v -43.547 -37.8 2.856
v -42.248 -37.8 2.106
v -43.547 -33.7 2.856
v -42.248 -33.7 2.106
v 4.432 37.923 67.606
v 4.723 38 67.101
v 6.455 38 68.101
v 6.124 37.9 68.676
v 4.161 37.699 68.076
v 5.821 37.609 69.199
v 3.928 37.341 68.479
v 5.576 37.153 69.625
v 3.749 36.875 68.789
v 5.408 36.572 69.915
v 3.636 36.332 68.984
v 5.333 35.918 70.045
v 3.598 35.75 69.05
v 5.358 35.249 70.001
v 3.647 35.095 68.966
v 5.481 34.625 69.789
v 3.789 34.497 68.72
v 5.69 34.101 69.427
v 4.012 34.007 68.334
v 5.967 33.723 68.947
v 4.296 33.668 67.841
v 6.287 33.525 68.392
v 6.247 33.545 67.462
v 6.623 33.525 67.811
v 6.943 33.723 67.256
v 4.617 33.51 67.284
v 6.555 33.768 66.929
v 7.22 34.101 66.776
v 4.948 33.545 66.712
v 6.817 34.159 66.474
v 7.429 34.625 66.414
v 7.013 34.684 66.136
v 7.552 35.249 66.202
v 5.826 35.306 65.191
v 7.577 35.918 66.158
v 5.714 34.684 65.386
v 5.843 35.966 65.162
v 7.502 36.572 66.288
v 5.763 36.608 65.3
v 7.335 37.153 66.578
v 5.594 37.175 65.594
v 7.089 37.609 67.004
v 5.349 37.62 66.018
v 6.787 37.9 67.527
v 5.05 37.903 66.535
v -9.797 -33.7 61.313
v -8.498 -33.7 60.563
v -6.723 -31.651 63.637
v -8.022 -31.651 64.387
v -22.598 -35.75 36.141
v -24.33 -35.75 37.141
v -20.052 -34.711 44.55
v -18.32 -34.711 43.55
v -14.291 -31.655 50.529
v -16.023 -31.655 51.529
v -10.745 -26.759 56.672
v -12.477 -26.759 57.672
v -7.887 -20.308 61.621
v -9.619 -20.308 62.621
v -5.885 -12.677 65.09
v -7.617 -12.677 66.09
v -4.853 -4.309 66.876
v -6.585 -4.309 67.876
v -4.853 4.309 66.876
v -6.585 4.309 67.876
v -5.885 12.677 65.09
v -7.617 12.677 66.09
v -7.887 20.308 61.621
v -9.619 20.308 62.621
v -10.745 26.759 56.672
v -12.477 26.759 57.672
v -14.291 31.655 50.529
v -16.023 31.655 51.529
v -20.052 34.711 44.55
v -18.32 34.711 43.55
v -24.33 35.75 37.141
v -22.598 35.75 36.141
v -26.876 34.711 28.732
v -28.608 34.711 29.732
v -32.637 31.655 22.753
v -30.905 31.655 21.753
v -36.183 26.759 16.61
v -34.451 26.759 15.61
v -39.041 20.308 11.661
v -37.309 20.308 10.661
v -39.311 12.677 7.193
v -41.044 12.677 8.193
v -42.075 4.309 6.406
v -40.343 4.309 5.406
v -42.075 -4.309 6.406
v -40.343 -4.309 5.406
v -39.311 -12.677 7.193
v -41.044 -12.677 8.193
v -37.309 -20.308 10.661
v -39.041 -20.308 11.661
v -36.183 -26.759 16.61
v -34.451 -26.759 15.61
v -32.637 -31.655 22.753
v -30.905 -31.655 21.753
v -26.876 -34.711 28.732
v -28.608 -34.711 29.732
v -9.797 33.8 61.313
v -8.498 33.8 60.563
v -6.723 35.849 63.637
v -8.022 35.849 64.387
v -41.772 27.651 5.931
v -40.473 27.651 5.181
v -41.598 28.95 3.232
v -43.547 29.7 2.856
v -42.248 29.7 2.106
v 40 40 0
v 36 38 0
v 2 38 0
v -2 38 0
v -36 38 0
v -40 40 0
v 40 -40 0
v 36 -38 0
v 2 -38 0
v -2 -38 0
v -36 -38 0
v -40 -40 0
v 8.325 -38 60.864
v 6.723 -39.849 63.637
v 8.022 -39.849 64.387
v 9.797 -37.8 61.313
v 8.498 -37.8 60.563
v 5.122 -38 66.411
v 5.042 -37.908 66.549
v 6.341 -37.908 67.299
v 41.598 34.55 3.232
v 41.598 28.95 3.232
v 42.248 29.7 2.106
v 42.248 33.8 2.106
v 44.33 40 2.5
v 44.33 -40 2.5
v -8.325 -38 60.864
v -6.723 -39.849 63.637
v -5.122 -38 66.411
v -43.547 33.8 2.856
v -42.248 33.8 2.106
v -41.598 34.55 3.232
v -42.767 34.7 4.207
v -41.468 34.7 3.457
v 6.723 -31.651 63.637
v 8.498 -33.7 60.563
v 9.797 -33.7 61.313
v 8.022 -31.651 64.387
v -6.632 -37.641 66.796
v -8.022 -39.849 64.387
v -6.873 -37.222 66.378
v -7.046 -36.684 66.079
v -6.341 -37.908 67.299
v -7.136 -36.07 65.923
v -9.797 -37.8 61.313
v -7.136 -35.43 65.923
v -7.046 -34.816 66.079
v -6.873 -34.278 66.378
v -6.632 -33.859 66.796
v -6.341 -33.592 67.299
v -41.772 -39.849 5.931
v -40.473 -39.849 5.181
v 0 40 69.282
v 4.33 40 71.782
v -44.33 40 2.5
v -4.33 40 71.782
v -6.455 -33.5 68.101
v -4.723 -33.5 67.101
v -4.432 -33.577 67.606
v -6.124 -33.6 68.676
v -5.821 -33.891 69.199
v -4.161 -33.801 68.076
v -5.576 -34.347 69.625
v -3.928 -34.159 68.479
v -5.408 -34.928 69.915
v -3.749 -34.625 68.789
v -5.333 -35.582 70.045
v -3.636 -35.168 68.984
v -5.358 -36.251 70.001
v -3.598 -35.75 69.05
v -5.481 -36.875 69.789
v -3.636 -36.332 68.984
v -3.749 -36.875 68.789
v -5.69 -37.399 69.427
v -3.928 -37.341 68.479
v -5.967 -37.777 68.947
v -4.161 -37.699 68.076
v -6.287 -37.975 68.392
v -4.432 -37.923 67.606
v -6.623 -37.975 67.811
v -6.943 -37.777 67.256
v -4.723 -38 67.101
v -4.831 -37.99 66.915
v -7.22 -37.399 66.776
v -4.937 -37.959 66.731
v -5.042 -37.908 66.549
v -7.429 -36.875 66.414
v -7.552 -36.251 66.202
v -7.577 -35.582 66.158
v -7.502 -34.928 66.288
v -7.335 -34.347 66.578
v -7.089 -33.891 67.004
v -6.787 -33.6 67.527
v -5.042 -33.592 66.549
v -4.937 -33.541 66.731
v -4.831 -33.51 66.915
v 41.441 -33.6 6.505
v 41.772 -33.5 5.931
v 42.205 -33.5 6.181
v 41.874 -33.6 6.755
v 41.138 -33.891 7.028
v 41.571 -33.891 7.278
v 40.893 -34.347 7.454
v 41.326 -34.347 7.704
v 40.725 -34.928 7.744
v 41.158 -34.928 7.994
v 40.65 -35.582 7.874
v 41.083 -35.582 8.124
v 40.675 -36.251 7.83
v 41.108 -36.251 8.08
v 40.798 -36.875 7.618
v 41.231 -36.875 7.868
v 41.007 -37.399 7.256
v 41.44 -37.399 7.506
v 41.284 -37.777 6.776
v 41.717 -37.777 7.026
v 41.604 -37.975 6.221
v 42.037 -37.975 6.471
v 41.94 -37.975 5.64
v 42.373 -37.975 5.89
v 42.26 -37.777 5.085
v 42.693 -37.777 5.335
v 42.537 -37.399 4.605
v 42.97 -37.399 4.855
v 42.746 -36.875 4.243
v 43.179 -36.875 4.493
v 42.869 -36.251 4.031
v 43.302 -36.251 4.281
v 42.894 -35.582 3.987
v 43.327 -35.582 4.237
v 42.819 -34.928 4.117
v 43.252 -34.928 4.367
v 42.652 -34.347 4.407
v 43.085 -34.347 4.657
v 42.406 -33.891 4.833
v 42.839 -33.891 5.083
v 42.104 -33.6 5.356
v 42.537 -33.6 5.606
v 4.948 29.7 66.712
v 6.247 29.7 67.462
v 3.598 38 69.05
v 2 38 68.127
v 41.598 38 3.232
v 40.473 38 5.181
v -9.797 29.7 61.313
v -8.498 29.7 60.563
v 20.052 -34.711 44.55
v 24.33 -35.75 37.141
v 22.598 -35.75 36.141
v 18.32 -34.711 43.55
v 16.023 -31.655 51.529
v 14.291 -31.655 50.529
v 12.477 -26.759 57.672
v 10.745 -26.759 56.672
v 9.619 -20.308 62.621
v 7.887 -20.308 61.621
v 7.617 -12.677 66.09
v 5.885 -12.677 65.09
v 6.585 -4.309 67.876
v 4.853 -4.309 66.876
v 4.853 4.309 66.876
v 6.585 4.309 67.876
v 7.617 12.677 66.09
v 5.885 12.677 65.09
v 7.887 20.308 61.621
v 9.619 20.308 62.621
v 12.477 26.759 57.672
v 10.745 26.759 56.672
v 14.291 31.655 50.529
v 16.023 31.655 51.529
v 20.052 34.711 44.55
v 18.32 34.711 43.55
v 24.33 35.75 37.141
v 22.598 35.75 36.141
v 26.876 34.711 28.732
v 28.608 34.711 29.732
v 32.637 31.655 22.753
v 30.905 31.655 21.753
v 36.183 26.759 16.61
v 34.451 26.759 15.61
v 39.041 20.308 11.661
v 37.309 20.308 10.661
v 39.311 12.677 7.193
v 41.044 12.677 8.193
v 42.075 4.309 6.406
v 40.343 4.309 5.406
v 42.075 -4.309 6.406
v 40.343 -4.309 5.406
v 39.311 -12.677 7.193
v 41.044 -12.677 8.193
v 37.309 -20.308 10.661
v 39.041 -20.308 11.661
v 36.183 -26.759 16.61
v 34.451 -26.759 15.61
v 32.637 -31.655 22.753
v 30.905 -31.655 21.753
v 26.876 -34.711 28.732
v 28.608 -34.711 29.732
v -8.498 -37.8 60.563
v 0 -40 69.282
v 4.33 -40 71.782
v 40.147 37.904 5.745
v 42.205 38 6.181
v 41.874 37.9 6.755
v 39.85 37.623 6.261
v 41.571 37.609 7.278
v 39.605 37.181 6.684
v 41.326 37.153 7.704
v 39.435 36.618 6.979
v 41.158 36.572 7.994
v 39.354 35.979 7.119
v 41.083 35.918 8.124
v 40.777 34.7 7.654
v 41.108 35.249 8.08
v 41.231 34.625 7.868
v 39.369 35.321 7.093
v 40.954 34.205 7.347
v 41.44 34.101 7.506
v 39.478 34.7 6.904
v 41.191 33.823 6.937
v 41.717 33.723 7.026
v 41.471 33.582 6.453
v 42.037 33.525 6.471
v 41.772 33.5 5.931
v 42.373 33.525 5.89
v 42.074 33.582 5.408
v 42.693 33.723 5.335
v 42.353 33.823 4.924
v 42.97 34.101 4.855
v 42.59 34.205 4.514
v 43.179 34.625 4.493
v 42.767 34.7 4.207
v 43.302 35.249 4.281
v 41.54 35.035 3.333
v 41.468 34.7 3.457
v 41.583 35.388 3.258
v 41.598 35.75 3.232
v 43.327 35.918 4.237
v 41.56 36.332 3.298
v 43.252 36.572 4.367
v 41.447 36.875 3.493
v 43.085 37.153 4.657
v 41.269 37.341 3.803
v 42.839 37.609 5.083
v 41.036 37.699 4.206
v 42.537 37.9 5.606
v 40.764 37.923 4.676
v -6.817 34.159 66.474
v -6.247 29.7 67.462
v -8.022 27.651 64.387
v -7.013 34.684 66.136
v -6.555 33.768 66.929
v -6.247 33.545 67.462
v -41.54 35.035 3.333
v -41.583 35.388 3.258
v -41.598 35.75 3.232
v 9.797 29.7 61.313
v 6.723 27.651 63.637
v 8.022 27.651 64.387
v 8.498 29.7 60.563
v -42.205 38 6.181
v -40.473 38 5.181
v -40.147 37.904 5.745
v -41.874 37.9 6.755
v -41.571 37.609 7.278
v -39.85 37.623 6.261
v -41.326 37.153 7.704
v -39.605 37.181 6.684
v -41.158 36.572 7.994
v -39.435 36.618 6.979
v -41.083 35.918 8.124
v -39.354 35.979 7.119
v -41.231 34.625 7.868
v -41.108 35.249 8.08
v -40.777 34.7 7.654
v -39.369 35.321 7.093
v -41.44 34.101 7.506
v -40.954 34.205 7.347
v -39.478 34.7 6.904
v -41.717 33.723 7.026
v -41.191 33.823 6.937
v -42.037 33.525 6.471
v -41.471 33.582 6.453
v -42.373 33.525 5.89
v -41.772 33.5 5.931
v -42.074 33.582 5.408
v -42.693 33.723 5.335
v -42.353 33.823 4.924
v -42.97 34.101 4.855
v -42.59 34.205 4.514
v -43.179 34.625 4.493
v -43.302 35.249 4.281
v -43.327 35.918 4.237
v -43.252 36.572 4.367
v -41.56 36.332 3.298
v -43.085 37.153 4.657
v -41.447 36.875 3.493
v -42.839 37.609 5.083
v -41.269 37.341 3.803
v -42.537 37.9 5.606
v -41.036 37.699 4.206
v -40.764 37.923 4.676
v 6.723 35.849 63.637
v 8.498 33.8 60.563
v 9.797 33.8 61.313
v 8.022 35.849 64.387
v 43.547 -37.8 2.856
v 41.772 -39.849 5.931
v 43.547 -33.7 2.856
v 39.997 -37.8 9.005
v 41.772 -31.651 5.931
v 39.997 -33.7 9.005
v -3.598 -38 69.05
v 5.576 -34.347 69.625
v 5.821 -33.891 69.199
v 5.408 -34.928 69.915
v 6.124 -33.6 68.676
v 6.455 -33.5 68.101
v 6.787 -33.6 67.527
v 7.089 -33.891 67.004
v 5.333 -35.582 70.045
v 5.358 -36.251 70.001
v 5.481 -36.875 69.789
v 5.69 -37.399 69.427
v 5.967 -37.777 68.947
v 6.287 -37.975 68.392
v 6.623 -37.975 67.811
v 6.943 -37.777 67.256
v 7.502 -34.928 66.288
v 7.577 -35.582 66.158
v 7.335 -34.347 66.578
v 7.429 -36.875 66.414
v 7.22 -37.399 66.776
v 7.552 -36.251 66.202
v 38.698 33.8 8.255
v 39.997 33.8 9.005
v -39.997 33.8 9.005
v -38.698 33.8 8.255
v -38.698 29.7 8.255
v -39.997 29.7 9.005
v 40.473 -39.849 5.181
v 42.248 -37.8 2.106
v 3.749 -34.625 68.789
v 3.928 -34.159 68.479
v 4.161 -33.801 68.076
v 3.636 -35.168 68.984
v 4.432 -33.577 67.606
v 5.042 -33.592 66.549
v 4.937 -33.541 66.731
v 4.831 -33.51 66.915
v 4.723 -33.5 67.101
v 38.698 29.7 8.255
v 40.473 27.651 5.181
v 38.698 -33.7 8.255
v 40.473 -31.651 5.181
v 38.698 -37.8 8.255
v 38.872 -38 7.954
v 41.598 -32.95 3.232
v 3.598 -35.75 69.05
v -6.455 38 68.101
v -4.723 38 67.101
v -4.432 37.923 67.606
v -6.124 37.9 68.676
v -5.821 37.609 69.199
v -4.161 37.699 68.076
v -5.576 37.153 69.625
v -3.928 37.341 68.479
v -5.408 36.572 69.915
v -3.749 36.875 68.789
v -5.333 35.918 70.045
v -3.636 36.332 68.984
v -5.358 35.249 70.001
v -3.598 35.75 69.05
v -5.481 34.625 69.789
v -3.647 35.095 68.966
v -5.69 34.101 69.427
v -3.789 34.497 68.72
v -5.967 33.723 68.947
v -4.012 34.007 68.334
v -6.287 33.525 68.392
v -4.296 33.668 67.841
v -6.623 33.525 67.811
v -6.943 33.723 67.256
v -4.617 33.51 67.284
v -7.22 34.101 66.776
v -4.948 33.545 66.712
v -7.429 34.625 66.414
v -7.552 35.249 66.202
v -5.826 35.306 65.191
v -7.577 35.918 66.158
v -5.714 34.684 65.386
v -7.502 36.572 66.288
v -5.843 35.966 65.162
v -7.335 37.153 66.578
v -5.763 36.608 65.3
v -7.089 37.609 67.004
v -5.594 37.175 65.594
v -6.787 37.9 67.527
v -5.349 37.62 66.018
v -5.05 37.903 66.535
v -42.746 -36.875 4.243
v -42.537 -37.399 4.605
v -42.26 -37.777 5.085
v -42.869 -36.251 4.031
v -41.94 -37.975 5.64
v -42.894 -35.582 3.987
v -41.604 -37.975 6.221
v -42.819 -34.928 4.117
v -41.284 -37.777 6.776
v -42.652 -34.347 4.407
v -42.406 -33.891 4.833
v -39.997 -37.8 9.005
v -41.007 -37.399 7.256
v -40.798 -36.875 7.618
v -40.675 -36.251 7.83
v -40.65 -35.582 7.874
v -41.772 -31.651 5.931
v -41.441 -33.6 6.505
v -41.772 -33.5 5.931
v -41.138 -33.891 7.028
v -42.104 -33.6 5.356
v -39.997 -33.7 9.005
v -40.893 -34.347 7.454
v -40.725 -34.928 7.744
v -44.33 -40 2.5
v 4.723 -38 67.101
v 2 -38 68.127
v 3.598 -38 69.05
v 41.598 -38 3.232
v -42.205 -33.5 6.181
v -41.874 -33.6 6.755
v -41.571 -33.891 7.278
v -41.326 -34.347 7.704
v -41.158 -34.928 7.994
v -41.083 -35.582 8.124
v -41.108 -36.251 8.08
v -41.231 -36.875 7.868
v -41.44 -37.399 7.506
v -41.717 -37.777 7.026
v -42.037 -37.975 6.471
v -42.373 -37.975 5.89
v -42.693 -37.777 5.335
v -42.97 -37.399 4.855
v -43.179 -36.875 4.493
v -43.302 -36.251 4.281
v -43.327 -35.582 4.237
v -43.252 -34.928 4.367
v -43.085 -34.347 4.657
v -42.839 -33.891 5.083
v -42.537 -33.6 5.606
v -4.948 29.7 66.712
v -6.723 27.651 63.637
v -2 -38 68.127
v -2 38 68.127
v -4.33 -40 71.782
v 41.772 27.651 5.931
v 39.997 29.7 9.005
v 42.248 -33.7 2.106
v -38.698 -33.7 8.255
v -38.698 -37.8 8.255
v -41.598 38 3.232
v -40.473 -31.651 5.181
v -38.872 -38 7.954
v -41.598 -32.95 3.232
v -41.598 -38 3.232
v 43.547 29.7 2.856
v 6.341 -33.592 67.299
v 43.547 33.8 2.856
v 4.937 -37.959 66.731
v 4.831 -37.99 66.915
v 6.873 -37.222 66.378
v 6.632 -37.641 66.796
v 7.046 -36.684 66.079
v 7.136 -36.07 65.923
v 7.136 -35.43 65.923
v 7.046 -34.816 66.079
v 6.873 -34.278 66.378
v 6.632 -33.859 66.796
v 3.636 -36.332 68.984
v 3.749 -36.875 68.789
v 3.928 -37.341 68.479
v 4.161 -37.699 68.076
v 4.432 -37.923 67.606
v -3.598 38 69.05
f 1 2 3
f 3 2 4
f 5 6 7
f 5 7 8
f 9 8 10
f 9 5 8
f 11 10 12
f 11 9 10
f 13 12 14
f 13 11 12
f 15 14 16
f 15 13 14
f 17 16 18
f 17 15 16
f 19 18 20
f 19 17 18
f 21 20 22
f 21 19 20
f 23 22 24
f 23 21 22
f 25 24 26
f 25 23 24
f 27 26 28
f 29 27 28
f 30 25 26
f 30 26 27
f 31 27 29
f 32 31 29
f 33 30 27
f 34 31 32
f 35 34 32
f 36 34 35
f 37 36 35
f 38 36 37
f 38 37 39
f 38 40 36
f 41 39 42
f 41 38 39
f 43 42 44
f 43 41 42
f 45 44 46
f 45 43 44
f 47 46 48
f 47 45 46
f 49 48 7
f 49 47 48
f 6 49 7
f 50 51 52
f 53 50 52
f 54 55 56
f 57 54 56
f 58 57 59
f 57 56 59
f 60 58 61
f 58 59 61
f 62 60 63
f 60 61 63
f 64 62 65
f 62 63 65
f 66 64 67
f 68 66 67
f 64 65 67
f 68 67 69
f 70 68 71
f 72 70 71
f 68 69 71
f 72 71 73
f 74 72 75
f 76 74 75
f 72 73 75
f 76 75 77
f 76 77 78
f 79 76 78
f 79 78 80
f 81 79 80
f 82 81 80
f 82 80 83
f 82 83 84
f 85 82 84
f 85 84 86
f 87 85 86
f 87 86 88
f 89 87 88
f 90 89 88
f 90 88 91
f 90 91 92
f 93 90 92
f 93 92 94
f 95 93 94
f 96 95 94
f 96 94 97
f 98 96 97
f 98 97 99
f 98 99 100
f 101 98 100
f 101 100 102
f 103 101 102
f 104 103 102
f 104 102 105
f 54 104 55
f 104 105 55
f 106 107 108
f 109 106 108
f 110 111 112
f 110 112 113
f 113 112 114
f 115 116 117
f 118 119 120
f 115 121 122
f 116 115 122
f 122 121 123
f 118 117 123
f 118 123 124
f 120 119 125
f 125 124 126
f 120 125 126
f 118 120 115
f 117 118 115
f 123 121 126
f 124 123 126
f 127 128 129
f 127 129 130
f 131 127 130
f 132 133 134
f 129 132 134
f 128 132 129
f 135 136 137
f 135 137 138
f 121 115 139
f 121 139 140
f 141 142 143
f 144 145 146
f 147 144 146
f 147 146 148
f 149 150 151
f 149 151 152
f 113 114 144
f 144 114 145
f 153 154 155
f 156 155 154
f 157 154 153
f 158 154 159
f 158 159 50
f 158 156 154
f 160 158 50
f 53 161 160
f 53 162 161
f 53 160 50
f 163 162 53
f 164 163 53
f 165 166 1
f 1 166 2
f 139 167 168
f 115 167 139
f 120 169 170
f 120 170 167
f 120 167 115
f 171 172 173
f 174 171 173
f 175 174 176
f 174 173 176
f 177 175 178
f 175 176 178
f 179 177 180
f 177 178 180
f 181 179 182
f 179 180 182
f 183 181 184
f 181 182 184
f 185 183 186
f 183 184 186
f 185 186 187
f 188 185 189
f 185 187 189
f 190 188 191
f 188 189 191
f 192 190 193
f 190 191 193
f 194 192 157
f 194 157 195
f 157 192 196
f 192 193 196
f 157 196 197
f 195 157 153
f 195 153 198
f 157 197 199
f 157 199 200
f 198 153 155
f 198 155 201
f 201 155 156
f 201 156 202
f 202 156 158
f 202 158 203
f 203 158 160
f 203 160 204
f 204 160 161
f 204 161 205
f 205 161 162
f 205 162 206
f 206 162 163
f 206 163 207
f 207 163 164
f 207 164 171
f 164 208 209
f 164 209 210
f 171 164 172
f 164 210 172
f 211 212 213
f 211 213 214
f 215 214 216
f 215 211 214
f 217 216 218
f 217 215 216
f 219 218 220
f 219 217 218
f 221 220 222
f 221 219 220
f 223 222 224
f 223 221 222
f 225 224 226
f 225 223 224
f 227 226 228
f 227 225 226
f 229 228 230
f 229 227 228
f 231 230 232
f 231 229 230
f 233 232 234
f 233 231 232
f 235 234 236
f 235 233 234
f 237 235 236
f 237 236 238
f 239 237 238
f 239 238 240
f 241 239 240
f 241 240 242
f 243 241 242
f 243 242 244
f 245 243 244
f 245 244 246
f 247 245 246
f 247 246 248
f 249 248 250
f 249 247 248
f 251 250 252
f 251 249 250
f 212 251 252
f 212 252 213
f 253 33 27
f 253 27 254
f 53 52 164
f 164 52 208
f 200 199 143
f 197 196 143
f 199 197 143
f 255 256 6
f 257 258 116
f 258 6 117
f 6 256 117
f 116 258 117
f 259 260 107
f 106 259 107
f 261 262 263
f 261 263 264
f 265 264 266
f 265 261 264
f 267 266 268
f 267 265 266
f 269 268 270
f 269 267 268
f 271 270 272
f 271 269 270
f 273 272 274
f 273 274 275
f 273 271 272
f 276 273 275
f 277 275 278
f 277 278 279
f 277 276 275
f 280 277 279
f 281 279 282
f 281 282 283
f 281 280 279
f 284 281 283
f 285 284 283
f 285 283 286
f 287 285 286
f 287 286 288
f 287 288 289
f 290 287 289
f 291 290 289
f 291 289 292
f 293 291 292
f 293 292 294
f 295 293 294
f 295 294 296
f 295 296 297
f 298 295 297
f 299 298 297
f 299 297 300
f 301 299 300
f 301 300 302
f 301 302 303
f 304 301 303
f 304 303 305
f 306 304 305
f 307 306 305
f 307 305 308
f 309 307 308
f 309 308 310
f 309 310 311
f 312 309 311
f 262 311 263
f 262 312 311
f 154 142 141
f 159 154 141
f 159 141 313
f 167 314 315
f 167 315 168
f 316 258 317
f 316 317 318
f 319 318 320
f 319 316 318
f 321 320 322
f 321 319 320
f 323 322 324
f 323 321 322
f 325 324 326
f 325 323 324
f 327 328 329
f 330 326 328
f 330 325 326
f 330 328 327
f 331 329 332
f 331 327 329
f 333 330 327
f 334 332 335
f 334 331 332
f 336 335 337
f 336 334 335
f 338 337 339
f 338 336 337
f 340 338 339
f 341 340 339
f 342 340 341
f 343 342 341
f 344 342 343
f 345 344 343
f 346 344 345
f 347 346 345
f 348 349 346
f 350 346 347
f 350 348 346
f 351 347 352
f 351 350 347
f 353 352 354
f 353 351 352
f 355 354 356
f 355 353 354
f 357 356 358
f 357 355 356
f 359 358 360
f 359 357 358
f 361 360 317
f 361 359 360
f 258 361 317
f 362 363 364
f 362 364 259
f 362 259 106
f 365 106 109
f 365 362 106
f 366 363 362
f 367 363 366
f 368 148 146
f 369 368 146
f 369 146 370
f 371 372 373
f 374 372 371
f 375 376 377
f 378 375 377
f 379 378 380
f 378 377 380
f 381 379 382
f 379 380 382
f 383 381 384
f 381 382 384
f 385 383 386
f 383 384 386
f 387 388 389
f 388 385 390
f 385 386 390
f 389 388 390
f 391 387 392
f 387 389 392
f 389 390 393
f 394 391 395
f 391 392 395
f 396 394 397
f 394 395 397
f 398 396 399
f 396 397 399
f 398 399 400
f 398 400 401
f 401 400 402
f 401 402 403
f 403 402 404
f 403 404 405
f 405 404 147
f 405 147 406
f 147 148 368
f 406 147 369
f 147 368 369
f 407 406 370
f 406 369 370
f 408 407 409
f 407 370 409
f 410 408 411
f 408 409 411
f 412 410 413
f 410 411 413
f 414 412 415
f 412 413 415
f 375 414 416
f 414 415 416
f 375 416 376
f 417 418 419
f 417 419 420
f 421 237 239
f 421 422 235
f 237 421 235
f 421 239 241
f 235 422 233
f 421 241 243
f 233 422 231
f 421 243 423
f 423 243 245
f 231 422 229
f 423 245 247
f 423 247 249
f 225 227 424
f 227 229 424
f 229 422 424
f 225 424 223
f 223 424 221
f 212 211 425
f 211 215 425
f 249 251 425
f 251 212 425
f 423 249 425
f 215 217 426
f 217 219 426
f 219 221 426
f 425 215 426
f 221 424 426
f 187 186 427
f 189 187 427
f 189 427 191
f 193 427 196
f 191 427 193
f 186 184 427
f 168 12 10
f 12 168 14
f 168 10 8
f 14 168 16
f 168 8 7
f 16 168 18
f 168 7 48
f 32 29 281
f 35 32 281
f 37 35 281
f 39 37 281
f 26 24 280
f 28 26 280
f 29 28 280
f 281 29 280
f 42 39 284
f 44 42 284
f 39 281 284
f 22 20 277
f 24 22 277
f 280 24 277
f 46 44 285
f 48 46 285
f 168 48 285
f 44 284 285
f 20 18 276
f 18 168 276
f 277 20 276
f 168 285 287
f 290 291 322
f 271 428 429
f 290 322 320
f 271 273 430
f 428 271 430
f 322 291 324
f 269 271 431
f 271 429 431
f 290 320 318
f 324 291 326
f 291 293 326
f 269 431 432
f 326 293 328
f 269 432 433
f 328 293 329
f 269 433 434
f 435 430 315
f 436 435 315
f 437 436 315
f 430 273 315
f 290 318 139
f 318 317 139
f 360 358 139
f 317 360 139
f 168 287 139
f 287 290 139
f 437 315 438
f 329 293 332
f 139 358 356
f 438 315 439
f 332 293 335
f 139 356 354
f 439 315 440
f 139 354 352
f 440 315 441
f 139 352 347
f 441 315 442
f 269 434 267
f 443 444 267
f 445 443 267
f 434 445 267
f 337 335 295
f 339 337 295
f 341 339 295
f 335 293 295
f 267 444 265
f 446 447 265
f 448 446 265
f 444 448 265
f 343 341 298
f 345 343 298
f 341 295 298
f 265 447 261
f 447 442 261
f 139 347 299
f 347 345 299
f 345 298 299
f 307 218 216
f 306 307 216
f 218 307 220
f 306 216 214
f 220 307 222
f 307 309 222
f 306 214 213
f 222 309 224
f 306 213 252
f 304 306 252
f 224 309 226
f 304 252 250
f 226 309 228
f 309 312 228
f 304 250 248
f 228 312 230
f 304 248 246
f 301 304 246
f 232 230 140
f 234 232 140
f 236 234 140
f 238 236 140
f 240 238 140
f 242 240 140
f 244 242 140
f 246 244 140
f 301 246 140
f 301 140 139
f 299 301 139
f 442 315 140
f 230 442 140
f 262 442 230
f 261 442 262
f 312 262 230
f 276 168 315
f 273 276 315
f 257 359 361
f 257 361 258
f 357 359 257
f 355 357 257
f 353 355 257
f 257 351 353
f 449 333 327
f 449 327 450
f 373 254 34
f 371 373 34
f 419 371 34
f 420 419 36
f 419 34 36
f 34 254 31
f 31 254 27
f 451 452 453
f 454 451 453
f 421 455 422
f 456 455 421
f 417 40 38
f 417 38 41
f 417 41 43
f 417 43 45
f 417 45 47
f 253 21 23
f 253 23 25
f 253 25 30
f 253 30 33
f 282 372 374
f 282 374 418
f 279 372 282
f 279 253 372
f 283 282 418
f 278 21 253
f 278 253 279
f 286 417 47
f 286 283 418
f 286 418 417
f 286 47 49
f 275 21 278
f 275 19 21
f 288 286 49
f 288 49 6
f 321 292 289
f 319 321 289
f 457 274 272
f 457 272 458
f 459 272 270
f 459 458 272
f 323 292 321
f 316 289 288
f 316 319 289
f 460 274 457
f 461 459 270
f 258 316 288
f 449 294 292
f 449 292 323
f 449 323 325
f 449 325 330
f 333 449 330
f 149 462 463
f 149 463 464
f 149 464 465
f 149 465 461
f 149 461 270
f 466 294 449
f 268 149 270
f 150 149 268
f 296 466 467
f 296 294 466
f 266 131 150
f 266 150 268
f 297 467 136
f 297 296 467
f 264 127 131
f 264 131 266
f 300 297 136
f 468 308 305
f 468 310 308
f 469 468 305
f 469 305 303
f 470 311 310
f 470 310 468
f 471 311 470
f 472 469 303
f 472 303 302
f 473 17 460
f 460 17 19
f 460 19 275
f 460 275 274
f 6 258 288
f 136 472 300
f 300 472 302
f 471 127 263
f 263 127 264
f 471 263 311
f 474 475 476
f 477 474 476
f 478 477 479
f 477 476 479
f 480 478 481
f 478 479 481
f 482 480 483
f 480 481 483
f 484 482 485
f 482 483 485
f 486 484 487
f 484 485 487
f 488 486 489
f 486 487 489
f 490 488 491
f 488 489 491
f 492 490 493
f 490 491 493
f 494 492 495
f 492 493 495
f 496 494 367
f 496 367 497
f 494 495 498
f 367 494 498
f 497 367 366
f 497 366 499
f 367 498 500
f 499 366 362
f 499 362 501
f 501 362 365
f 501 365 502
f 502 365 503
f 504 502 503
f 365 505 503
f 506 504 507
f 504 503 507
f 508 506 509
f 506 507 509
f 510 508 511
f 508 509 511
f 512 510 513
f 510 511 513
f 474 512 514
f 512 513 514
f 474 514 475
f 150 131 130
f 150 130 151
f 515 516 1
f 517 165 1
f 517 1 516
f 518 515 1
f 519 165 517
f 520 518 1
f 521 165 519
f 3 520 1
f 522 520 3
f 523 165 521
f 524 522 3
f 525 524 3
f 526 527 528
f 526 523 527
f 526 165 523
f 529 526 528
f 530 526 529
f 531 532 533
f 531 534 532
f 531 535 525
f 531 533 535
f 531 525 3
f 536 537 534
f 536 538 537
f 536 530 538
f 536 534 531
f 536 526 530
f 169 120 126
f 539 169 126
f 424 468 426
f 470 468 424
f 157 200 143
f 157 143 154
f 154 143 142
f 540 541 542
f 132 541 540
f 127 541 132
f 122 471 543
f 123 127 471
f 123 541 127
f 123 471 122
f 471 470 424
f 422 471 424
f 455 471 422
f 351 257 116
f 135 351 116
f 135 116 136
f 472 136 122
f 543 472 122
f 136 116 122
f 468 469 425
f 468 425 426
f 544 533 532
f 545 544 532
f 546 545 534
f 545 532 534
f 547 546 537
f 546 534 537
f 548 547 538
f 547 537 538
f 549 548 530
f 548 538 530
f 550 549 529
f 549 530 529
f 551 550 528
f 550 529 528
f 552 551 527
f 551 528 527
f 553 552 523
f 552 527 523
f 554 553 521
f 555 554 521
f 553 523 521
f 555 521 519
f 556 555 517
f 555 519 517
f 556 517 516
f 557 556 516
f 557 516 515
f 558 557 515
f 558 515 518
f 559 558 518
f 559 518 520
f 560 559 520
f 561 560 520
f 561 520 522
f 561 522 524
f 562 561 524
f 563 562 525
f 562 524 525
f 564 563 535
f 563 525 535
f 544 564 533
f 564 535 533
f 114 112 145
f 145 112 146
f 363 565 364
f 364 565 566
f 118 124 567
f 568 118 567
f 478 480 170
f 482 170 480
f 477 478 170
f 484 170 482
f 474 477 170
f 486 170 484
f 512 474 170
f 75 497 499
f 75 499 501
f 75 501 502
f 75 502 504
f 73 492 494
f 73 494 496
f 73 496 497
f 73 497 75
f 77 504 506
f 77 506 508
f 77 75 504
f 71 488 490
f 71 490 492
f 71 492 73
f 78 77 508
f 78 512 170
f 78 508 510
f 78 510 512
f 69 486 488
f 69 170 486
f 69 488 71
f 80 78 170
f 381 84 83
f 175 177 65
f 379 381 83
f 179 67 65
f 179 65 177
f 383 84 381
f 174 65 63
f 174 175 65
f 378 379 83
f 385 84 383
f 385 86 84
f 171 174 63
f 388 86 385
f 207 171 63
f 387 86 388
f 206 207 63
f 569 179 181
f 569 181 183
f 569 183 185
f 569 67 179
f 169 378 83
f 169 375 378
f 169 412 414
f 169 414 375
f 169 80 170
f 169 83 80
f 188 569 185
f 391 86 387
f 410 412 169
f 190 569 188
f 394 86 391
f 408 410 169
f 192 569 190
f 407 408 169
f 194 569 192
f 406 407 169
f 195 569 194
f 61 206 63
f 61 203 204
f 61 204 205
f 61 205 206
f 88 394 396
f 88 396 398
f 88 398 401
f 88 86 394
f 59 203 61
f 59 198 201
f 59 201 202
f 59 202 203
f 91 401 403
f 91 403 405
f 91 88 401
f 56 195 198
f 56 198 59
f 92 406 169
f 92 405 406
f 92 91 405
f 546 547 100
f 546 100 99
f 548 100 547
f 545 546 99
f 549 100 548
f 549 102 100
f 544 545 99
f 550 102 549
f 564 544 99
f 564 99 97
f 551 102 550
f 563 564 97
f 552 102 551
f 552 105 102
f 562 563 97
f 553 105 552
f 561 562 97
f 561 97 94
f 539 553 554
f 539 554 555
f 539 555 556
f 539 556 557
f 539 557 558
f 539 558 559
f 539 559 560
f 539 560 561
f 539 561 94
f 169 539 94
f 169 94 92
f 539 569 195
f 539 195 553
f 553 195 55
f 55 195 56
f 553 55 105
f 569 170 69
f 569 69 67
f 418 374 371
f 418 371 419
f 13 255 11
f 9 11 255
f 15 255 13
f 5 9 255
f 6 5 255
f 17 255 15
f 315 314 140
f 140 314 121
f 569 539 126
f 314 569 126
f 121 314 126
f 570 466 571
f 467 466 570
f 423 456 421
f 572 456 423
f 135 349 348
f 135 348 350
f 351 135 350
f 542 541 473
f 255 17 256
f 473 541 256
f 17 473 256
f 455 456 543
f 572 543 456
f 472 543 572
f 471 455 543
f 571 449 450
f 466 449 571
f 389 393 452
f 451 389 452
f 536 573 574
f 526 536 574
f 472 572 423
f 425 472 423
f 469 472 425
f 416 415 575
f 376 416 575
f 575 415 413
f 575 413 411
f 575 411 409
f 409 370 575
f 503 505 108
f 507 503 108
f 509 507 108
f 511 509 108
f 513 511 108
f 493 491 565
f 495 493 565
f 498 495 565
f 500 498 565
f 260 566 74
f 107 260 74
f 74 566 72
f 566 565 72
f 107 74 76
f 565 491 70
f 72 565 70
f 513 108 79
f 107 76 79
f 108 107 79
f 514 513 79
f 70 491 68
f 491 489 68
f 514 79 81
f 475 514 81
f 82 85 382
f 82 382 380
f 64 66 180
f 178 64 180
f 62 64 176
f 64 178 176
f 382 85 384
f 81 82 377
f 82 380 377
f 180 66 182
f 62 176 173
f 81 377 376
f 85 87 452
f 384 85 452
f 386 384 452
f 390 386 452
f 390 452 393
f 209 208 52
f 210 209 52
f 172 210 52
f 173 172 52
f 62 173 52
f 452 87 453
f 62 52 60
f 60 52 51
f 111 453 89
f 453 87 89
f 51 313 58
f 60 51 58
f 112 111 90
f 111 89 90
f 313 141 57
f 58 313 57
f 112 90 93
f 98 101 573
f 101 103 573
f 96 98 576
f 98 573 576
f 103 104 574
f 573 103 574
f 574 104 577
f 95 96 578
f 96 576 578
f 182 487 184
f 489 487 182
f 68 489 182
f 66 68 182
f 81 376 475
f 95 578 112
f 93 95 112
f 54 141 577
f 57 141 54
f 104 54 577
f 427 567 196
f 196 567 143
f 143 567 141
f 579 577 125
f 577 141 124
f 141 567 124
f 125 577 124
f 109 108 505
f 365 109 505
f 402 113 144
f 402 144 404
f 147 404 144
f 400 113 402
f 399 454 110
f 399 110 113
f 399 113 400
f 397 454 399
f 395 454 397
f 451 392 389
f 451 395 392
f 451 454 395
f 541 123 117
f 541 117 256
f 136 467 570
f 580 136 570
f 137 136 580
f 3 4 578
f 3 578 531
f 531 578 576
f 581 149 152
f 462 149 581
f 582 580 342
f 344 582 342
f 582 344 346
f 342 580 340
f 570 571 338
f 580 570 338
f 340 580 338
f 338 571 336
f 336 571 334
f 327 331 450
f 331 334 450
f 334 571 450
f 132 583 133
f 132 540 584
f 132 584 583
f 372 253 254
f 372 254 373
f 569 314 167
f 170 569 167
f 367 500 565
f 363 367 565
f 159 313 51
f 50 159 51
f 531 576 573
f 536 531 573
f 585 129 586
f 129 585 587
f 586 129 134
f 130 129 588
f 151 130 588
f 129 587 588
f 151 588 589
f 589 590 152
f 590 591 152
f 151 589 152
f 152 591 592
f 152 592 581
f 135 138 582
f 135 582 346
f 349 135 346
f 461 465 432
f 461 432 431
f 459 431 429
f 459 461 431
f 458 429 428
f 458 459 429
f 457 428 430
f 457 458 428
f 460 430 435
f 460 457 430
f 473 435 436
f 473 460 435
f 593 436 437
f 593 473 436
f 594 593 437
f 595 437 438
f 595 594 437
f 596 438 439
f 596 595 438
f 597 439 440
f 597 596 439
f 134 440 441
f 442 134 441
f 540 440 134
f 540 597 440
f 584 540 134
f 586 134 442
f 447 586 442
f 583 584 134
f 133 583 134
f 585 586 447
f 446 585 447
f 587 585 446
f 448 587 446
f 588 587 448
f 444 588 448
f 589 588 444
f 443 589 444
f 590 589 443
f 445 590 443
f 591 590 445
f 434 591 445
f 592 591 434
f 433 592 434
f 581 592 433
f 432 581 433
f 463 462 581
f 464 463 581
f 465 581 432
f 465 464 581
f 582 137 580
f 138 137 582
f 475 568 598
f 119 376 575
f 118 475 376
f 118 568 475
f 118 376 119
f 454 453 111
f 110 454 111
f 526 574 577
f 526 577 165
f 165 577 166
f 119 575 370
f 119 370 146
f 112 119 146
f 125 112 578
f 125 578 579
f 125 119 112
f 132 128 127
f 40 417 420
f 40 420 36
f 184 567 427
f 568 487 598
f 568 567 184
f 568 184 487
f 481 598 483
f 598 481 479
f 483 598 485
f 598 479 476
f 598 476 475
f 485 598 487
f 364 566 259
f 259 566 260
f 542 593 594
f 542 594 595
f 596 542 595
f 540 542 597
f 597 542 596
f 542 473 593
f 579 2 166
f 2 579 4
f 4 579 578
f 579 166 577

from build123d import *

# Parameters (mm, degrees)
F1_DEPTH = 40
F2_DEPTH = 5
F4_T     = -2
F3_R     = 35.75
F5_DEPTH = 5
F6_D     = 4.5
F6_DEPTH = 2
F6_TIP   = 1.3519363928
F8_DEPTH = 1.5


with BuildPart() as f1:
    # F0 (on Front) → F1 (new body, symmetric)
    with BuildSketch(Plane.XZ):
        Polygon((0, 69.2820323028), (-40, 0), (0, 0), align=None)
    extrude(amount=F1_DEPTH, both=True)

    # F2 (add): a face of the model
    f2_faces = [f1.faces().sort_by_distance(p)[0] for p in [
        (-20, 0, 34.6410161514),
    ]]
    extrude(f2_faces, amount=F2_DEPTH)

    # F4
    f4_openings = [f1.faces().sort_by_distance(p)[0] for p in [
        (-20, 0, 0),
    ]]
    offset(amount=F4_T, openings=f4_openings)

    # F3 (on face) → F5 (cut)
    with BuildSketch(Plane(origin=(-34.3301270189, 0, 19.8205080757), x_dir=(0, -1, 0), z_dir=(-0.8660254038, 0, 0.5))):
        with Locations((0, 20)):
            Circle(F3_R)
    extrude(amount=-F5_DEPTH, mode=Mode.SUBTRACT)

    # F6
    with Locations(Plane(origin=(-34.3301270189, 0, 19.8205080757), x_dir=(0, -1, 0), z_dir=(-0.8660254038, 0, 0.5))):
        with Locations((35.75, 55.75), (35.75, -15.75), (-35.75, -15.75), (-35.75, 55.75)):
            Hole(F6_D / 2, depth=F6_DEPTH)
            with Locations((0, 0, -(F6_DEPTH + F6_TIP / 2))):  # 118° drill point
                Cone(0, F6_D / 2, F6_TIP, mode=Mode.SUBTRACT)

    # F7 (on face) → F8 (cut)
    with BuildSketch(Plane(origin=(-32.5980762114, 0, 18.8205080757), x_dir=(0, 1, 0), z_dir=(0.8660254038, 0, -0.5))):
        Polygon((-33.7004065444, -12.2), (-37.7995934556, -12.2), (-39.8491869112, -15.75), (-37.7995934556, -19.3), (-33.7004065444, -19.3), (-31.6508130888, -15.75), align=None)
        Polygon((-37.7995934556, 55.3), (-39.8491869112, 51.75), (-37.7995934556, 48.2), (-33.7004065444, 48.2), (-31.6508130888, 51.75), (-33.7004065444, 55.3), align=None)
        Polygon((29.7004065444, -12.2), (27.6508130888, -15.75), (29.7004065444, -19.3), (33.7995934556, -19.3), (35.8491869112, -15.75), (33.7995934556, -12.2), align=None)
        Polygon((29.7004065444, 55.3), (27.6508130888, 51.75), (29.7004065444, 48.2), (33.7995934556, 48.2), (35.8491869112, 51.75), (33.7995934556, 55.3), align=None)
    extrude(amount=-F8_DEPTH, mode=Mode.SUBTRACT)

    # F9: F1 across face


with BuildPart() as f1_1:
    add(f1.part)
    add(f1.part.mirror(Plane(origin=(0, 0, 34.6410161514), x_dir=(0, 1, 0), z_dir=(1, 0, 0))))


solid = f1_1.part
